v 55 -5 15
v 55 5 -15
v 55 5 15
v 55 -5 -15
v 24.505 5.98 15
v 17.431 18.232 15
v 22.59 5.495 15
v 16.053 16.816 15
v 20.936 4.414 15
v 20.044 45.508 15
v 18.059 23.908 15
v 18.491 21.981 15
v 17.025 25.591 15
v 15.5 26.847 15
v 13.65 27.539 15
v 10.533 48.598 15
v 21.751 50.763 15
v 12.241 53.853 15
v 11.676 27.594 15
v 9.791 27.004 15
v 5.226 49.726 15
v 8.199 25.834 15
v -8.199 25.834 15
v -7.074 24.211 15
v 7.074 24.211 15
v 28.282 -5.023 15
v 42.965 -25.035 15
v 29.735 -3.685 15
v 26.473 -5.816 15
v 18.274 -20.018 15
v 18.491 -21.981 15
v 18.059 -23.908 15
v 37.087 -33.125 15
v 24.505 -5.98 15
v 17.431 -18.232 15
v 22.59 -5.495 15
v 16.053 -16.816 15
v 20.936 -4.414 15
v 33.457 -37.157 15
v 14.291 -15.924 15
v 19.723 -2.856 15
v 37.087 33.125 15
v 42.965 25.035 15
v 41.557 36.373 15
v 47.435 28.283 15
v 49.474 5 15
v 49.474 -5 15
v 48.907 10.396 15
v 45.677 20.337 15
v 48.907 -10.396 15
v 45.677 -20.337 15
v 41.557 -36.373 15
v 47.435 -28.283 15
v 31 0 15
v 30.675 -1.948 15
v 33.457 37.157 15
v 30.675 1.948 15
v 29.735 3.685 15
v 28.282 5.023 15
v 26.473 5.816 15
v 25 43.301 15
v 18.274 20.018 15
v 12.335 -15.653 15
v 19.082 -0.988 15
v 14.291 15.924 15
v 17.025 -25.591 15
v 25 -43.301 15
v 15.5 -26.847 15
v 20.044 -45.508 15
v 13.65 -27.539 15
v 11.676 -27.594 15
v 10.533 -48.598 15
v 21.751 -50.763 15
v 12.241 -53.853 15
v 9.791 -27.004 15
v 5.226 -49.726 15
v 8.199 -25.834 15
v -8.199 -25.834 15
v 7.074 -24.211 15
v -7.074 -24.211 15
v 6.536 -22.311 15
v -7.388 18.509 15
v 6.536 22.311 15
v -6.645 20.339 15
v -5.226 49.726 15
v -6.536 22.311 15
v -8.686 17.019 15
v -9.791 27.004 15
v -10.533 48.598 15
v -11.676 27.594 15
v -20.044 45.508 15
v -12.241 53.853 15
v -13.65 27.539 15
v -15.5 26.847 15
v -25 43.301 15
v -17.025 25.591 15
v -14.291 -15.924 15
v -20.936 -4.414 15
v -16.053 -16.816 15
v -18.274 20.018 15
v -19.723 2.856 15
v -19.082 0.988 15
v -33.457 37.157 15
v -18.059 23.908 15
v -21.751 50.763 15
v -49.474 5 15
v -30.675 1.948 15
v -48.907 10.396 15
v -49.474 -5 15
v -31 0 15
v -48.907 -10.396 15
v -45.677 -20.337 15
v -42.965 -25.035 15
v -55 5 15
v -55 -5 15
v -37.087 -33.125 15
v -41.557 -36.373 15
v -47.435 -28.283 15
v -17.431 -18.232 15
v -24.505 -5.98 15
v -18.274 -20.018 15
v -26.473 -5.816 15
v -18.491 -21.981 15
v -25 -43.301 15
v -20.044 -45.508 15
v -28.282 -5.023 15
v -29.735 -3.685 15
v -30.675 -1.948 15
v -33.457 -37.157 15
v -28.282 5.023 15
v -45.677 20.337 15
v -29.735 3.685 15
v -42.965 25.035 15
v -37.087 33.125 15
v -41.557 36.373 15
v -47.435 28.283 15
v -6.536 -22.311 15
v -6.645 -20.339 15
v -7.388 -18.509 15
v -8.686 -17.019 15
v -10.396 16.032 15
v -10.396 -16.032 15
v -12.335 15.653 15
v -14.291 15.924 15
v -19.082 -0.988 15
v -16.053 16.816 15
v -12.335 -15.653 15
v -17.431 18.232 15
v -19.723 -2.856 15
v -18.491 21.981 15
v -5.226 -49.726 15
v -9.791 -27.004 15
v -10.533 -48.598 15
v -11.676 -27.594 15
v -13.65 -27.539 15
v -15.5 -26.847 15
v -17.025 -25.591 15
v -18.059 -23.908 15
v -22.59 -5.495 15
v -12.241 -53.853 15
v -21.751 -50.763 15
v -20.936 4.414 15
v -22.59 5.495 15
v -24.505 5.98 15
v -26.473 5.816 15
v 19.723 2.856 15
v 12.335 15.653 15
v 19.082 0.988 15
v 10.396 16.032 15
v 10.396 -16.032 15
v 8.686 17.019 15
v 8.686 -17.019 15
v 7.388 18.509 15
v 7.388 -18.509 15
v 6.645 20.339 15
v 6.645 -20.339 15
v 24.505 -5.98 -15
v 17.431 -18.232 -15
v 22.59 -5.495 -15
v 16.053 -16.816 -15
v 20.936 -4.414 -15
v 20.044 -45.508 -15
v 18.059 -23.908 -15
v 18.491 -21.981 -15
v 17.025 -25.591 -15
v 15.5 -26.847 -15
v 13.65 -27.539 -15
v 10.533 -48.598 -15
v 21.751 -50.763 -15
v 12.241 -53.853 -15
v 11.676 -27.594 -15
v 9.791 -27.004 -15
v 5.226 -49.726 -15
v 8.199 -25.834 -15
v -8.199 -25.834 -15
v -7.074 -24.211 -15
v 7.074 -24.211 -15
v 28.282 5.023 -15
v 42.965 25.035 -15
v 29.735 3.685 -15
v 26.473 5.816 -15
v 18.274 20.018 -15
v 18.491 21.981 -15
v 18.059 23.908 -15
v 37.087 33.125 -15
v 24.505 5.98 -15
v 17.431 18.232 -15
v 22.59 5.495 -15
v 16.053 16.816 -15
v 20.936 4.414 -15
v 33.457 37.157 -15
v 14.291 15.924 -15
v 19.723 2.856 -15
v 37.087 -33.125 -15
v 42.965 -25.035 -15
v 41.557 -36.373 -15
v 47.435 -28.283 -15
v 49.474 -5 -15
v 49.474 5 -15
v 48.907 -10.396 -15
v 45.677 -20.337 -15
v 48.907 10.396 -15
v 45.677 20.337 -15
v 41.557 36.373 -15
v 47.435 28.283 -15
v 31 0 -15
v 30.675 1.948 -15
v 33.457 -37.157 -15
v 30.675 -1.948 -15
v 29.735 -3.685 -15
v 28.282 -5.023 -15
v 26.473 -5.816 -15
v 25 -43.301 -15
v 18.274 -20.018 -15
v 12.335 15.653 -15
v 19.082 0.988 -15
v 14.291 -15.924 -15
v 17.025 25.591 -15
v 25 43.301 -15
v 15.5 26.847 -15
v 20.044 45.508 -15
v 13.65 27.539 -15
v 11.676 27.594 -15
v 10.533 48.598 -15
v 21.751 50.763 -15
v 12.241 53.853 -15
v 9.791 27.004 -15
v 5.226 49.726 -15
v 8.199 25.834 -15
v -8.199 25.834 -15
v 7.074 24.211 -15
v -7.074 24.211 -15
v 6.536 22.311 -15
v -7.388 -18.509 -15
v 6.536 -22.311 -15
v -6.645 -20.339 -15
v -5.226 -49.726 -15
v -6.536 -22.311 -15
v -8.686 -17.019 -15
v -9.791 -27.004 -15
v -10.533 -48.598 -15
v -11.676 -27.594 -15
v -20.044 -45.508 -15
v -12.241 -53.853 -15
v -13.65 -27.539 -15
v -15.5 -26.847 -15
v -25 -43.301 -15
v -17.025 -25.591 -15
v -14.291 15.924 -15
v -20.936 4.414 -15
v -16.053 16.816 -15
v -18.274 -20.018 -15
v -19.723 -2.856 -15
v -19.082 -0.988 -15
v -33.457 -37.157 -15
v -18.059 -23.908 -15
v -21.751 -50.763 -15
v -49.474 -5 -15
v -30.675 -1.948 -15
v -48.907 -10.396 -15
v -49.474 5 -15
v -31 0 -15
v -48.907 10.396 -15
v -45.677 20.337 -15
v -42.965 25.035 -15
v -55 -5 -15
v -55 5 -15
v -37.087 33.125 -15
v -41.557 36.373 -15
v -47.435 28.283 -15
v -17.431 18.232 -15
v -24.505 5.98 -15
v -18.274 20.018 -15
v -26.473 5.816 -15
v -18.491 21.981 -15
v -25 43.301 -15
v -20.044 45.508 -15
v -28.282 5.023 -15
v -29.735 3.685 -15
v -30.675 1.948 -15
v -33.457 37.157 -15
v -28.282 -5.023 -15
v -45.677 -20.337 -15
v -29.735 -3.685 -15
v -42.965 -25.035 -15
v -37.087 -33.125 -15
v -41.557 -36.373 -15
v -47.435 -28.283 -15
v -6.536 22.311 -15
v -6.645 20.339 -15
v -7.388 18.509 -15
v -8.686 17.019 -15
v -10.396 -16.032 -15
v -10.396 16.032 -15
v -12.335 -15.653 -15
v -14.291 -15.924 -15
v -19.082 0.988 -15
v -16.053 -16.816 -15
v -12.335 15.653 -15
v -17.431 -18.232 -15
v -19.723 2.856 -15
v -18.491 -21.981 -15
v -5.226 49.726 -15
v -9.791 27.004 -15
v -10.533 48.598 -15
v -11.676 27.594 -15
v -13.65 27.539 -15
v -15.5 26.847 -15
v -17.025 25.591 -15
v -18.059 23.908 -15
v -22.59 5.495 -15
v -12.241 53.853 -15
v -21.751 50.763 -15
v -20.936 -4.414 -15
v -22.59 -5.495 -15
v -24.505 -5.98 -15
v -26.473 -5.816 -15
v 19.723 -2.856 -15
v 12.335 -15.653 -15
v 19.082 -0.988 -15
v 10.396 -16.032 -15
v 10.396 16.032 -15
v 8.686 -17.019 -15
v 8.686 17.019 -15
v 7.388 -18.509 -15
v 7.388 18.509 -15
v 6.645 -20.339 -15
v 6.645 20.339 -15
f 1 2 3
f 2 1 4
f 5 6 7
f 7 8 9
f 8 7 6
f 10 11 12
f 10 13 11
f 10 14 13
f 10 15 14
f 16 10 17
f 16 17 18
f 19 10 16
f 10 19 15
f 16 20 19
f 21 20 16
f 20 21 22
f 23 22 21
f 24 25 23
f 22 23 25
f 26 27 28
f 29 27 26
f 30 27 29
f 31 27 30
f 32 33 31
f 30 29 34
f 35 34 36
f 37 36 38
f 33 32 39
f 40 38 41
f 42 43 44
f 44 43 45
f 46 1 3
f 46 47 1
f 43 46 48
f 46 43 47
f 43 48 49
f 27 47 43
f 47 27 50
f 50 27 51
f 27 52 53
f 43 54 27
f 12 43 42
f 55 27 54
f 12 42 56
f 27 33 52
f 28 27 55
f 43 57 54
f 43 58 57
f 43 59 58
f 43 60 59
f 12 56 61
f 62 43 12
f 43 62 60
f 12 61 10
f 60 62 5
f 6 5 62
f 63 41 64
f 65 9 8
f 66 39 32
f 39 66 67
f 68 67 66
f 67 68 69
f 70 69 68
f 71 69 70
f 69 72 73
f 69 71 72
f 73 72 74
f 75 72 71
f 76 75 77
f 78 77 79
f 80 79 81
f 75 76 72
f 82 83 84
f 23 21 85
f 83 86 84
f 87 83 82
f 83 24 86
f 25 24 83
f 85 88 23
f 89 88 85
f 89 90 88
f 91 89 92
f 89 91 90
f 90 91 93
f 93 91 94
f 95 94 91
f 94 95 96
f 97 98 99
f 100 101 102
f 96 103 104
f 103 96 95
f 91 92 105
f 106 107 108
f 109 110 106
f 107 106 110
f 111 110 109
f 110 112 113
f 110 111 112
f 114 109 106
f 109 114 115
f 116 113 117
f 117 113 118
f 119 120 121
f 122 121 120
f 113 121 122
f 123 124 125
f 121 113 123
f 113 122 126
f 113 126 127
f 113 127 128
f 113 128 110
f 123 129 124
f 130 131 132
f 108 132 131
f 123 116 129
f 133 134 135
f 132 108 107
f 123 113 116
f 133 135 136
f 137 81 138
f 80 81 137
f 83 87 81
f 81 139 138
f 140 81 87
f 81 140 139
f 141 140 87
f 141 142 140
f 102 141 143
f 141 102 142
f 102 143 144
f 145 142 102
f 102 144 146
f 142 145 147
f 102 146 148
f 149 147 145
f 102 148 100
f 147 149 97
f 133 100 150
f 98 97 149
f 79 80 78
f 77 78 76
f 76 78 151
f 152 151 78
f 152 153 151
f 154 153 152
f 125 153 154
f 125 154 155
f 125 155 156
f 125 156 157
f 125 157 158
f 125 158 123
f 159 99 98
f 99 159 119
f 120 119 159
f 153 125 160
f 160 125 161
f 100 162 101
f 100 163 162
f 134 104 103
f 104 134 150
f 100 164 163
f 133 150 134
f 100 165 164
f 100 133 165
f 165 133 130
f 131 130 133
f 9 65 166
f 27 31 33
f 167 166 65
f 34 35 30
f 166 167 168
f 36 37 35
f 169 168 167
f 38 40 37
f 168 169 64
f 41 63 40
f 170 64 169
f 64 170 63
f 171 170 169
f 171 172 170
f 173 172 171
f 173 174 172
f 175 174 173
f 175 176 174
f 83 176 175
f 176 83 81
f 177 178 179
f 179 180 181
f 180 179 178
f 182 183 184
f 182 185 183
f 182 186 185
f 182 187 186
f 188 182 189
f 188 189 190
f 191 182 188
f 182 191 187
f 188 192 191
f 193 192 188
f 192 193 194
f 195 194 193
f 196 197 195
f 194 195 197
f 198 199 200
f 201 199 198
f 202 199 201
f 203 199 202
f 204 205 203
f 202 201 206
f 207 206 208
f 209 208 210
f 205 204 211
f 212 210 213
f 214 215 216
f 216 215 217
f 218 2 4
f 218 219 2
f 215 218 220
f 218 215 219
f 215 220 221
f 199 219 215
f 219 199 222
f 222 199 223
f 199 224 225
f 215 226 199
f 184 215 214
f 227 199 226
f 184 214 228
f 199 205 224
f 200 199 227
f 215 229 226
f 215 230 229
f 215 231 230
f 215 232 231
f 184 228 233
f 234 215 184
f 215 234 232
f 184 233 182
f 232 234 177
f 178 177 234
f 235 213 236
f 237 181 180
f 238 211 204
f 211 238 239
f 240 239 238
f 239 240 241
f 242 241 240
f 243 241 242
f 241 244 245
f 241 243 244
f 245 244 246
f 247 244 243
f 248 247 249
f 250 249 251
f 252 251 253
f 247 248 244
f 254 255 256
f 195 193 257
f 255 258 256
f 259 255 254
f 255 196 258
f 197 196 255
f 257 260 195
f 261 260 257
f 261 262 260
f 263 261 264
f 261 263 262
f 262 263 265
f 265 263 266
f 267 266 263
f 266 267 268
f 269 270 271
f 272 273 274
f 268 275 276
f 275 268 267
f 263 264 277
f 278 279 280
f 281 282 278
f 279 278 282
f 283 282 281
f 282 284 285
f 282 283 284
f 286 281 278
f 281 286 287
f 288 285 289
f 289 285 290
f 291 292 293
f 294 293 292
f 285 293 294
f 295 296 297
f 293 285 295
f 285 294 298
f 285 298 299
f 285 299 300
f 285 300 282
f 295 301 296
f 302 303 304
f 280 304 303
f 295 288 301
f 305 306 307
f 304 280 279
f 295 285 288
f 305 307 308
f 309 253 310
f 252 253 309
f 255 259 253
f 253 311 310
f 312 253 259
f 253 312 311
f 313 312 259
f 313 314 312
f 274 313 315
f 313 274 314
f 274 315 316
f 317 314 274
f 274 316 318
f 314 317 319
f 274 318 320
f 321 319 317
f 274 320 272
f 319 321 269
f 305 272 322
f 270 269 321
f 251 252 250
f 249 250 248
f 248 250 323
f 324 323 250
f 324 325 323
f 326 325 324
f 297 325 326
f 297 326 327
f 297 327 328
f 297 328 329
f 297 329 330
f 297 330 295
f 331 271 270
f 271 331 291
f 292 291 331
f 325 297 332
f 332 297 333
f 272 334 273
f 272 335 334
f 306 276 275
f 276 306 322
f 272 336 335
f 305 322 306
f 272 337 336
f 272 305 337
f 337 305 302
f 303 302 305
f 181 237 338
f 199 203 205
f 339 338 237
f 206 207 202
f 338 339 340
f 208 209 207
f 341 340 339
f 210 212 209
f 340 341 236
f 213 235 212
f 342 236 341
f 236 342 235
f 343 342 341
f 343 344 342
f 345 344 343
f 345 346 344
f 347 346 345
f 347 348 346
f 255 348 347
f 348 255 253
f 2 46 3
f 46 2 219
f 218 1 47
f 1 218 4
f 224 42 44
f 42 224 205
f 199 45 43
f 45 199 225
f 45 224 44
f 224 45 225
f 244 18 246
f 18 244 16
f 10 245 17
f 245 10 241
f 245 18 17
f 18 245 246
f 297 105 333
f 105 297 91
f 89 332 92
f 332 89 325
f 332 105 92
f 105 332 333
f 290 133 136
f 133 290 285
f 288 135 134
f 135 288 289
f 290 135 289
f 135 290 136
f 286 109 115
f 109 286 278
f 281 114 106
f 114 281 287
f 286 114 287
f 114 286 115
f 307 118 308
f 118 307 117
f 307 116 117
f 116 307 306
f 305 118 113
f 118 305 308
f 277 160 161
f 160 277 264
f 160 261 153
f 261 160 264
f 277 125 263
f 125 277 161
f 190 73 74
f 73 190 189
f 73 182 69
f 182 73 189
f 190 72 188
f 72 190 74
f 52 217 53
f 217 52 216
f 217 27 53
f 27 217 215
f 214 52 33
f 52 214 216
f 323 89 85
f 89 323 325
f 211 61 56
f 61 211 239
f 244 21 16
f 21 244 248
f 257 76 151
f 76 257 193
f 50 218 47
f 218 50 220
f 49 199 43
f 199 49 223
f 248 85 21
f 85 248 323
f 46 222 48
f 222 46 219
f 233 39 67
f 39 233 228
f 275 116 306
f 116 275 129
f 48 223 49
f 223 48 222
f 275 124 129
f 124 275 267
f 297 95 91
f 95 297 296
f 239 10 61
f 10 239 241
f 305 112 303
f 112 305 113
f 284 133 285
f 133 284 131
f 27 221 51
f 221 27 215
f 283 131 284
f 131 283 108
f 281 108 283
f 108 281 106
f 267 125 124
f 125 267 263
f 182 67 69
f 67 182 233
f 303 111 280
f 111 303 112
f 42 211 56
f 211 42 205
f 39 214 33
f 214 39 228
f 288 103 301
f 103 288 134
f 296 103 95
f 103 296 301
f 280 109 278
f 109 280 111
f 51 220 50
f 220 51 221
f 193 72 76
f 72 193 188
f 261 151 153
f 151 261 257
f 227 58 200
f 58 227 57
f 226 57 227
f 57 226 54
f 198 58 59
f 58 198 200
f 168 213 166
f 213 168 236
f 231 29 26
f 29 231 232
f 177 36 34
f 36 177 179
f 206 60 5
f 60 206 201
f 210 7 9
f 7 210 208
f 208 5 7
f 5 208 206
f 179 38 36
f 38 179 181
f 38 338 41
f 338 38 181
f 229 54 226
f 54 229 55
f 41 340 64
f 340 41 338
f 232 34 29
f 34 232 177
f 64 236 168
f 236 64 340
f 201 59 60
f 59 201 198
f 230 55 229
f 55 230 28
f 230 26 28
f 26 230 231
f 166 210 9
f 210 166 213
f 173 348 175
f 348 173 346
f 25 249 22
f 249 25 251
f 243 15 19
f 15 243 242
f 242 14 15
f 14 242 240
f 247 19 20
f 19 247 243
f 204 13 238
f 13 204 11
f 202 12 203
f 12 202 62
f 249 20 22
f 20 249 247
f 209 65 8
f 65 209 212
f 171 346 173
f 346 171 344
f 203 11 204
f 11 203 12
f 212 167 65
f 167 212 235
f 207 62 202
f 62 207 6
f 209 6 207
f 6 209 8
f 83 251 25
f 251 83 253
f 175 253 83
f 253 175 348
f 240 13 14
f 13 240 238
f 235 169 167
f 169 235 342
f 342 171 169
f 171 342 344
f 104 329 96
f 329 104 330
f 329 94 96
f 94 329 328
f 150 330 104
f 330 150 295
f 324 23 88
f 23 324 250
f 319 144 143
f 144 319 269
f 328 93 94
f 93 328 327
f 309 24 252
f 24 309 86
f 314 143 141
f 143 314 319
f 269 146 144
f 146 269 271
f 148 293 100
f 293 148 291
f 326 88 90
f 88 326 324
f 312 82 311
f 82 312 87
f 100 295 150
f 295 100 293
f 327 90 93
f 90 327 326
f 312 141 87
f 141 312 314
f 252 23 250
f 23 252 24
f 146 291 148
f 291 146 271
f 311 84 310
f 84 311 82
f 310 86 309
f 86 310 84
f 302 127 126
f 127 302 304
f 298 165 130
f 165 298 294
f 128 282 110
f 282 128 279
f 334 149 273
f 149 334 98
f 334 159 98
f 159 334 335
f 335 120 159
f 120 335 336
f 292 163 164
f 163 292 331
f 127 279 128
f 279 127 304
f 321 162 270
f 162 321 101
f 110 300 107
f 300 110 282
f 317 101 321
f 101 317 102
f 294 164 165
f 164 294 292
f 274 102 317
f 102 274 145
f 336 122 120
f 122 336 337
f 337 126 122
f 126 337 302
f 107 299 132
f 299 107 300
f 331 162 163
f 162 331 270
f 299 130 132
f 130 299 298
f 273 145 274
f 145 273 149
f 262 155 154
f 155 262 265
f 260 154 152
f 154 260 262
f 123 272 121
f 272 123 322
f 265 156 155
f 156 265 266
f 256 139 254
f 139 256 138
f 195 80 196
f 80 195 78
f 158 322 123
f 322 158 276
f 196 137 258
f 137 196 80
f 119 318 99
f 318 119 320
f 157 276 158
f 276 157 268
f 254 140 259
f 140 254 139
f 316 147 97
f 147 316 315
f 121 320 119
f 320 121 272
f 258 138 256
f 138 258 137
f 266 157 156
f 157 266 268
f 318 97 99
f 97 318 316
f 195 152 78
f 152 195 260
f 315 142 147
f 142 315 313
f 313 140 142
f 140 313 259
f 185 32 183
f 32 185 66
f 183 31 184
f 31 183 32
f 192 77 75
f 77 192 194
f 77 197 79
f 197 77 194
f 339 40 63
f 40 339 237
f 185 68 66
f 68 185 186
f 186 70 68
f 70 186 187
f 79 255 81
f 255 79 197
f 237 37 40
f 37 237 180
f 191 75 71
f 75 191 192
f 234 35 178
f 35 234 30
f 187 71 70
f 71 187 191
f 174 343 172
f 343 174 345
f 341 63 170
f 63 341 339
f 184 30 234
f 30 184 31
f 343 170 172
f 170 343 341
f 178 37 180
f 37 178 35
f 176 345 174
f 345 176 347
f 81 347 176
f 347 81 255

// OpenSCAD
// globals
co_radius = 50;
co_height = 30;
n1 = 10;
n2 = 6;

module complexObject()
{
	difference()
	{
		union()
		{
			cylinder(r=co_radius, h=co_height, center=true);

			for(r=[0:n1])
			{
				rotate([0,0,r*360/n1]) 
				translate([co_radius, 0, 0]) cube([10,10,co_height], center=true);
			}
		}

		union()
		{
			for(r=[0:n2])
			{
				rotate([0,0,r*360/n2]) 
				translate([co_radius/2, 0, 0]) cylinder(r=6,h=co_height*1.1, center=true);
			}
		}
	}
}

complexObject();
